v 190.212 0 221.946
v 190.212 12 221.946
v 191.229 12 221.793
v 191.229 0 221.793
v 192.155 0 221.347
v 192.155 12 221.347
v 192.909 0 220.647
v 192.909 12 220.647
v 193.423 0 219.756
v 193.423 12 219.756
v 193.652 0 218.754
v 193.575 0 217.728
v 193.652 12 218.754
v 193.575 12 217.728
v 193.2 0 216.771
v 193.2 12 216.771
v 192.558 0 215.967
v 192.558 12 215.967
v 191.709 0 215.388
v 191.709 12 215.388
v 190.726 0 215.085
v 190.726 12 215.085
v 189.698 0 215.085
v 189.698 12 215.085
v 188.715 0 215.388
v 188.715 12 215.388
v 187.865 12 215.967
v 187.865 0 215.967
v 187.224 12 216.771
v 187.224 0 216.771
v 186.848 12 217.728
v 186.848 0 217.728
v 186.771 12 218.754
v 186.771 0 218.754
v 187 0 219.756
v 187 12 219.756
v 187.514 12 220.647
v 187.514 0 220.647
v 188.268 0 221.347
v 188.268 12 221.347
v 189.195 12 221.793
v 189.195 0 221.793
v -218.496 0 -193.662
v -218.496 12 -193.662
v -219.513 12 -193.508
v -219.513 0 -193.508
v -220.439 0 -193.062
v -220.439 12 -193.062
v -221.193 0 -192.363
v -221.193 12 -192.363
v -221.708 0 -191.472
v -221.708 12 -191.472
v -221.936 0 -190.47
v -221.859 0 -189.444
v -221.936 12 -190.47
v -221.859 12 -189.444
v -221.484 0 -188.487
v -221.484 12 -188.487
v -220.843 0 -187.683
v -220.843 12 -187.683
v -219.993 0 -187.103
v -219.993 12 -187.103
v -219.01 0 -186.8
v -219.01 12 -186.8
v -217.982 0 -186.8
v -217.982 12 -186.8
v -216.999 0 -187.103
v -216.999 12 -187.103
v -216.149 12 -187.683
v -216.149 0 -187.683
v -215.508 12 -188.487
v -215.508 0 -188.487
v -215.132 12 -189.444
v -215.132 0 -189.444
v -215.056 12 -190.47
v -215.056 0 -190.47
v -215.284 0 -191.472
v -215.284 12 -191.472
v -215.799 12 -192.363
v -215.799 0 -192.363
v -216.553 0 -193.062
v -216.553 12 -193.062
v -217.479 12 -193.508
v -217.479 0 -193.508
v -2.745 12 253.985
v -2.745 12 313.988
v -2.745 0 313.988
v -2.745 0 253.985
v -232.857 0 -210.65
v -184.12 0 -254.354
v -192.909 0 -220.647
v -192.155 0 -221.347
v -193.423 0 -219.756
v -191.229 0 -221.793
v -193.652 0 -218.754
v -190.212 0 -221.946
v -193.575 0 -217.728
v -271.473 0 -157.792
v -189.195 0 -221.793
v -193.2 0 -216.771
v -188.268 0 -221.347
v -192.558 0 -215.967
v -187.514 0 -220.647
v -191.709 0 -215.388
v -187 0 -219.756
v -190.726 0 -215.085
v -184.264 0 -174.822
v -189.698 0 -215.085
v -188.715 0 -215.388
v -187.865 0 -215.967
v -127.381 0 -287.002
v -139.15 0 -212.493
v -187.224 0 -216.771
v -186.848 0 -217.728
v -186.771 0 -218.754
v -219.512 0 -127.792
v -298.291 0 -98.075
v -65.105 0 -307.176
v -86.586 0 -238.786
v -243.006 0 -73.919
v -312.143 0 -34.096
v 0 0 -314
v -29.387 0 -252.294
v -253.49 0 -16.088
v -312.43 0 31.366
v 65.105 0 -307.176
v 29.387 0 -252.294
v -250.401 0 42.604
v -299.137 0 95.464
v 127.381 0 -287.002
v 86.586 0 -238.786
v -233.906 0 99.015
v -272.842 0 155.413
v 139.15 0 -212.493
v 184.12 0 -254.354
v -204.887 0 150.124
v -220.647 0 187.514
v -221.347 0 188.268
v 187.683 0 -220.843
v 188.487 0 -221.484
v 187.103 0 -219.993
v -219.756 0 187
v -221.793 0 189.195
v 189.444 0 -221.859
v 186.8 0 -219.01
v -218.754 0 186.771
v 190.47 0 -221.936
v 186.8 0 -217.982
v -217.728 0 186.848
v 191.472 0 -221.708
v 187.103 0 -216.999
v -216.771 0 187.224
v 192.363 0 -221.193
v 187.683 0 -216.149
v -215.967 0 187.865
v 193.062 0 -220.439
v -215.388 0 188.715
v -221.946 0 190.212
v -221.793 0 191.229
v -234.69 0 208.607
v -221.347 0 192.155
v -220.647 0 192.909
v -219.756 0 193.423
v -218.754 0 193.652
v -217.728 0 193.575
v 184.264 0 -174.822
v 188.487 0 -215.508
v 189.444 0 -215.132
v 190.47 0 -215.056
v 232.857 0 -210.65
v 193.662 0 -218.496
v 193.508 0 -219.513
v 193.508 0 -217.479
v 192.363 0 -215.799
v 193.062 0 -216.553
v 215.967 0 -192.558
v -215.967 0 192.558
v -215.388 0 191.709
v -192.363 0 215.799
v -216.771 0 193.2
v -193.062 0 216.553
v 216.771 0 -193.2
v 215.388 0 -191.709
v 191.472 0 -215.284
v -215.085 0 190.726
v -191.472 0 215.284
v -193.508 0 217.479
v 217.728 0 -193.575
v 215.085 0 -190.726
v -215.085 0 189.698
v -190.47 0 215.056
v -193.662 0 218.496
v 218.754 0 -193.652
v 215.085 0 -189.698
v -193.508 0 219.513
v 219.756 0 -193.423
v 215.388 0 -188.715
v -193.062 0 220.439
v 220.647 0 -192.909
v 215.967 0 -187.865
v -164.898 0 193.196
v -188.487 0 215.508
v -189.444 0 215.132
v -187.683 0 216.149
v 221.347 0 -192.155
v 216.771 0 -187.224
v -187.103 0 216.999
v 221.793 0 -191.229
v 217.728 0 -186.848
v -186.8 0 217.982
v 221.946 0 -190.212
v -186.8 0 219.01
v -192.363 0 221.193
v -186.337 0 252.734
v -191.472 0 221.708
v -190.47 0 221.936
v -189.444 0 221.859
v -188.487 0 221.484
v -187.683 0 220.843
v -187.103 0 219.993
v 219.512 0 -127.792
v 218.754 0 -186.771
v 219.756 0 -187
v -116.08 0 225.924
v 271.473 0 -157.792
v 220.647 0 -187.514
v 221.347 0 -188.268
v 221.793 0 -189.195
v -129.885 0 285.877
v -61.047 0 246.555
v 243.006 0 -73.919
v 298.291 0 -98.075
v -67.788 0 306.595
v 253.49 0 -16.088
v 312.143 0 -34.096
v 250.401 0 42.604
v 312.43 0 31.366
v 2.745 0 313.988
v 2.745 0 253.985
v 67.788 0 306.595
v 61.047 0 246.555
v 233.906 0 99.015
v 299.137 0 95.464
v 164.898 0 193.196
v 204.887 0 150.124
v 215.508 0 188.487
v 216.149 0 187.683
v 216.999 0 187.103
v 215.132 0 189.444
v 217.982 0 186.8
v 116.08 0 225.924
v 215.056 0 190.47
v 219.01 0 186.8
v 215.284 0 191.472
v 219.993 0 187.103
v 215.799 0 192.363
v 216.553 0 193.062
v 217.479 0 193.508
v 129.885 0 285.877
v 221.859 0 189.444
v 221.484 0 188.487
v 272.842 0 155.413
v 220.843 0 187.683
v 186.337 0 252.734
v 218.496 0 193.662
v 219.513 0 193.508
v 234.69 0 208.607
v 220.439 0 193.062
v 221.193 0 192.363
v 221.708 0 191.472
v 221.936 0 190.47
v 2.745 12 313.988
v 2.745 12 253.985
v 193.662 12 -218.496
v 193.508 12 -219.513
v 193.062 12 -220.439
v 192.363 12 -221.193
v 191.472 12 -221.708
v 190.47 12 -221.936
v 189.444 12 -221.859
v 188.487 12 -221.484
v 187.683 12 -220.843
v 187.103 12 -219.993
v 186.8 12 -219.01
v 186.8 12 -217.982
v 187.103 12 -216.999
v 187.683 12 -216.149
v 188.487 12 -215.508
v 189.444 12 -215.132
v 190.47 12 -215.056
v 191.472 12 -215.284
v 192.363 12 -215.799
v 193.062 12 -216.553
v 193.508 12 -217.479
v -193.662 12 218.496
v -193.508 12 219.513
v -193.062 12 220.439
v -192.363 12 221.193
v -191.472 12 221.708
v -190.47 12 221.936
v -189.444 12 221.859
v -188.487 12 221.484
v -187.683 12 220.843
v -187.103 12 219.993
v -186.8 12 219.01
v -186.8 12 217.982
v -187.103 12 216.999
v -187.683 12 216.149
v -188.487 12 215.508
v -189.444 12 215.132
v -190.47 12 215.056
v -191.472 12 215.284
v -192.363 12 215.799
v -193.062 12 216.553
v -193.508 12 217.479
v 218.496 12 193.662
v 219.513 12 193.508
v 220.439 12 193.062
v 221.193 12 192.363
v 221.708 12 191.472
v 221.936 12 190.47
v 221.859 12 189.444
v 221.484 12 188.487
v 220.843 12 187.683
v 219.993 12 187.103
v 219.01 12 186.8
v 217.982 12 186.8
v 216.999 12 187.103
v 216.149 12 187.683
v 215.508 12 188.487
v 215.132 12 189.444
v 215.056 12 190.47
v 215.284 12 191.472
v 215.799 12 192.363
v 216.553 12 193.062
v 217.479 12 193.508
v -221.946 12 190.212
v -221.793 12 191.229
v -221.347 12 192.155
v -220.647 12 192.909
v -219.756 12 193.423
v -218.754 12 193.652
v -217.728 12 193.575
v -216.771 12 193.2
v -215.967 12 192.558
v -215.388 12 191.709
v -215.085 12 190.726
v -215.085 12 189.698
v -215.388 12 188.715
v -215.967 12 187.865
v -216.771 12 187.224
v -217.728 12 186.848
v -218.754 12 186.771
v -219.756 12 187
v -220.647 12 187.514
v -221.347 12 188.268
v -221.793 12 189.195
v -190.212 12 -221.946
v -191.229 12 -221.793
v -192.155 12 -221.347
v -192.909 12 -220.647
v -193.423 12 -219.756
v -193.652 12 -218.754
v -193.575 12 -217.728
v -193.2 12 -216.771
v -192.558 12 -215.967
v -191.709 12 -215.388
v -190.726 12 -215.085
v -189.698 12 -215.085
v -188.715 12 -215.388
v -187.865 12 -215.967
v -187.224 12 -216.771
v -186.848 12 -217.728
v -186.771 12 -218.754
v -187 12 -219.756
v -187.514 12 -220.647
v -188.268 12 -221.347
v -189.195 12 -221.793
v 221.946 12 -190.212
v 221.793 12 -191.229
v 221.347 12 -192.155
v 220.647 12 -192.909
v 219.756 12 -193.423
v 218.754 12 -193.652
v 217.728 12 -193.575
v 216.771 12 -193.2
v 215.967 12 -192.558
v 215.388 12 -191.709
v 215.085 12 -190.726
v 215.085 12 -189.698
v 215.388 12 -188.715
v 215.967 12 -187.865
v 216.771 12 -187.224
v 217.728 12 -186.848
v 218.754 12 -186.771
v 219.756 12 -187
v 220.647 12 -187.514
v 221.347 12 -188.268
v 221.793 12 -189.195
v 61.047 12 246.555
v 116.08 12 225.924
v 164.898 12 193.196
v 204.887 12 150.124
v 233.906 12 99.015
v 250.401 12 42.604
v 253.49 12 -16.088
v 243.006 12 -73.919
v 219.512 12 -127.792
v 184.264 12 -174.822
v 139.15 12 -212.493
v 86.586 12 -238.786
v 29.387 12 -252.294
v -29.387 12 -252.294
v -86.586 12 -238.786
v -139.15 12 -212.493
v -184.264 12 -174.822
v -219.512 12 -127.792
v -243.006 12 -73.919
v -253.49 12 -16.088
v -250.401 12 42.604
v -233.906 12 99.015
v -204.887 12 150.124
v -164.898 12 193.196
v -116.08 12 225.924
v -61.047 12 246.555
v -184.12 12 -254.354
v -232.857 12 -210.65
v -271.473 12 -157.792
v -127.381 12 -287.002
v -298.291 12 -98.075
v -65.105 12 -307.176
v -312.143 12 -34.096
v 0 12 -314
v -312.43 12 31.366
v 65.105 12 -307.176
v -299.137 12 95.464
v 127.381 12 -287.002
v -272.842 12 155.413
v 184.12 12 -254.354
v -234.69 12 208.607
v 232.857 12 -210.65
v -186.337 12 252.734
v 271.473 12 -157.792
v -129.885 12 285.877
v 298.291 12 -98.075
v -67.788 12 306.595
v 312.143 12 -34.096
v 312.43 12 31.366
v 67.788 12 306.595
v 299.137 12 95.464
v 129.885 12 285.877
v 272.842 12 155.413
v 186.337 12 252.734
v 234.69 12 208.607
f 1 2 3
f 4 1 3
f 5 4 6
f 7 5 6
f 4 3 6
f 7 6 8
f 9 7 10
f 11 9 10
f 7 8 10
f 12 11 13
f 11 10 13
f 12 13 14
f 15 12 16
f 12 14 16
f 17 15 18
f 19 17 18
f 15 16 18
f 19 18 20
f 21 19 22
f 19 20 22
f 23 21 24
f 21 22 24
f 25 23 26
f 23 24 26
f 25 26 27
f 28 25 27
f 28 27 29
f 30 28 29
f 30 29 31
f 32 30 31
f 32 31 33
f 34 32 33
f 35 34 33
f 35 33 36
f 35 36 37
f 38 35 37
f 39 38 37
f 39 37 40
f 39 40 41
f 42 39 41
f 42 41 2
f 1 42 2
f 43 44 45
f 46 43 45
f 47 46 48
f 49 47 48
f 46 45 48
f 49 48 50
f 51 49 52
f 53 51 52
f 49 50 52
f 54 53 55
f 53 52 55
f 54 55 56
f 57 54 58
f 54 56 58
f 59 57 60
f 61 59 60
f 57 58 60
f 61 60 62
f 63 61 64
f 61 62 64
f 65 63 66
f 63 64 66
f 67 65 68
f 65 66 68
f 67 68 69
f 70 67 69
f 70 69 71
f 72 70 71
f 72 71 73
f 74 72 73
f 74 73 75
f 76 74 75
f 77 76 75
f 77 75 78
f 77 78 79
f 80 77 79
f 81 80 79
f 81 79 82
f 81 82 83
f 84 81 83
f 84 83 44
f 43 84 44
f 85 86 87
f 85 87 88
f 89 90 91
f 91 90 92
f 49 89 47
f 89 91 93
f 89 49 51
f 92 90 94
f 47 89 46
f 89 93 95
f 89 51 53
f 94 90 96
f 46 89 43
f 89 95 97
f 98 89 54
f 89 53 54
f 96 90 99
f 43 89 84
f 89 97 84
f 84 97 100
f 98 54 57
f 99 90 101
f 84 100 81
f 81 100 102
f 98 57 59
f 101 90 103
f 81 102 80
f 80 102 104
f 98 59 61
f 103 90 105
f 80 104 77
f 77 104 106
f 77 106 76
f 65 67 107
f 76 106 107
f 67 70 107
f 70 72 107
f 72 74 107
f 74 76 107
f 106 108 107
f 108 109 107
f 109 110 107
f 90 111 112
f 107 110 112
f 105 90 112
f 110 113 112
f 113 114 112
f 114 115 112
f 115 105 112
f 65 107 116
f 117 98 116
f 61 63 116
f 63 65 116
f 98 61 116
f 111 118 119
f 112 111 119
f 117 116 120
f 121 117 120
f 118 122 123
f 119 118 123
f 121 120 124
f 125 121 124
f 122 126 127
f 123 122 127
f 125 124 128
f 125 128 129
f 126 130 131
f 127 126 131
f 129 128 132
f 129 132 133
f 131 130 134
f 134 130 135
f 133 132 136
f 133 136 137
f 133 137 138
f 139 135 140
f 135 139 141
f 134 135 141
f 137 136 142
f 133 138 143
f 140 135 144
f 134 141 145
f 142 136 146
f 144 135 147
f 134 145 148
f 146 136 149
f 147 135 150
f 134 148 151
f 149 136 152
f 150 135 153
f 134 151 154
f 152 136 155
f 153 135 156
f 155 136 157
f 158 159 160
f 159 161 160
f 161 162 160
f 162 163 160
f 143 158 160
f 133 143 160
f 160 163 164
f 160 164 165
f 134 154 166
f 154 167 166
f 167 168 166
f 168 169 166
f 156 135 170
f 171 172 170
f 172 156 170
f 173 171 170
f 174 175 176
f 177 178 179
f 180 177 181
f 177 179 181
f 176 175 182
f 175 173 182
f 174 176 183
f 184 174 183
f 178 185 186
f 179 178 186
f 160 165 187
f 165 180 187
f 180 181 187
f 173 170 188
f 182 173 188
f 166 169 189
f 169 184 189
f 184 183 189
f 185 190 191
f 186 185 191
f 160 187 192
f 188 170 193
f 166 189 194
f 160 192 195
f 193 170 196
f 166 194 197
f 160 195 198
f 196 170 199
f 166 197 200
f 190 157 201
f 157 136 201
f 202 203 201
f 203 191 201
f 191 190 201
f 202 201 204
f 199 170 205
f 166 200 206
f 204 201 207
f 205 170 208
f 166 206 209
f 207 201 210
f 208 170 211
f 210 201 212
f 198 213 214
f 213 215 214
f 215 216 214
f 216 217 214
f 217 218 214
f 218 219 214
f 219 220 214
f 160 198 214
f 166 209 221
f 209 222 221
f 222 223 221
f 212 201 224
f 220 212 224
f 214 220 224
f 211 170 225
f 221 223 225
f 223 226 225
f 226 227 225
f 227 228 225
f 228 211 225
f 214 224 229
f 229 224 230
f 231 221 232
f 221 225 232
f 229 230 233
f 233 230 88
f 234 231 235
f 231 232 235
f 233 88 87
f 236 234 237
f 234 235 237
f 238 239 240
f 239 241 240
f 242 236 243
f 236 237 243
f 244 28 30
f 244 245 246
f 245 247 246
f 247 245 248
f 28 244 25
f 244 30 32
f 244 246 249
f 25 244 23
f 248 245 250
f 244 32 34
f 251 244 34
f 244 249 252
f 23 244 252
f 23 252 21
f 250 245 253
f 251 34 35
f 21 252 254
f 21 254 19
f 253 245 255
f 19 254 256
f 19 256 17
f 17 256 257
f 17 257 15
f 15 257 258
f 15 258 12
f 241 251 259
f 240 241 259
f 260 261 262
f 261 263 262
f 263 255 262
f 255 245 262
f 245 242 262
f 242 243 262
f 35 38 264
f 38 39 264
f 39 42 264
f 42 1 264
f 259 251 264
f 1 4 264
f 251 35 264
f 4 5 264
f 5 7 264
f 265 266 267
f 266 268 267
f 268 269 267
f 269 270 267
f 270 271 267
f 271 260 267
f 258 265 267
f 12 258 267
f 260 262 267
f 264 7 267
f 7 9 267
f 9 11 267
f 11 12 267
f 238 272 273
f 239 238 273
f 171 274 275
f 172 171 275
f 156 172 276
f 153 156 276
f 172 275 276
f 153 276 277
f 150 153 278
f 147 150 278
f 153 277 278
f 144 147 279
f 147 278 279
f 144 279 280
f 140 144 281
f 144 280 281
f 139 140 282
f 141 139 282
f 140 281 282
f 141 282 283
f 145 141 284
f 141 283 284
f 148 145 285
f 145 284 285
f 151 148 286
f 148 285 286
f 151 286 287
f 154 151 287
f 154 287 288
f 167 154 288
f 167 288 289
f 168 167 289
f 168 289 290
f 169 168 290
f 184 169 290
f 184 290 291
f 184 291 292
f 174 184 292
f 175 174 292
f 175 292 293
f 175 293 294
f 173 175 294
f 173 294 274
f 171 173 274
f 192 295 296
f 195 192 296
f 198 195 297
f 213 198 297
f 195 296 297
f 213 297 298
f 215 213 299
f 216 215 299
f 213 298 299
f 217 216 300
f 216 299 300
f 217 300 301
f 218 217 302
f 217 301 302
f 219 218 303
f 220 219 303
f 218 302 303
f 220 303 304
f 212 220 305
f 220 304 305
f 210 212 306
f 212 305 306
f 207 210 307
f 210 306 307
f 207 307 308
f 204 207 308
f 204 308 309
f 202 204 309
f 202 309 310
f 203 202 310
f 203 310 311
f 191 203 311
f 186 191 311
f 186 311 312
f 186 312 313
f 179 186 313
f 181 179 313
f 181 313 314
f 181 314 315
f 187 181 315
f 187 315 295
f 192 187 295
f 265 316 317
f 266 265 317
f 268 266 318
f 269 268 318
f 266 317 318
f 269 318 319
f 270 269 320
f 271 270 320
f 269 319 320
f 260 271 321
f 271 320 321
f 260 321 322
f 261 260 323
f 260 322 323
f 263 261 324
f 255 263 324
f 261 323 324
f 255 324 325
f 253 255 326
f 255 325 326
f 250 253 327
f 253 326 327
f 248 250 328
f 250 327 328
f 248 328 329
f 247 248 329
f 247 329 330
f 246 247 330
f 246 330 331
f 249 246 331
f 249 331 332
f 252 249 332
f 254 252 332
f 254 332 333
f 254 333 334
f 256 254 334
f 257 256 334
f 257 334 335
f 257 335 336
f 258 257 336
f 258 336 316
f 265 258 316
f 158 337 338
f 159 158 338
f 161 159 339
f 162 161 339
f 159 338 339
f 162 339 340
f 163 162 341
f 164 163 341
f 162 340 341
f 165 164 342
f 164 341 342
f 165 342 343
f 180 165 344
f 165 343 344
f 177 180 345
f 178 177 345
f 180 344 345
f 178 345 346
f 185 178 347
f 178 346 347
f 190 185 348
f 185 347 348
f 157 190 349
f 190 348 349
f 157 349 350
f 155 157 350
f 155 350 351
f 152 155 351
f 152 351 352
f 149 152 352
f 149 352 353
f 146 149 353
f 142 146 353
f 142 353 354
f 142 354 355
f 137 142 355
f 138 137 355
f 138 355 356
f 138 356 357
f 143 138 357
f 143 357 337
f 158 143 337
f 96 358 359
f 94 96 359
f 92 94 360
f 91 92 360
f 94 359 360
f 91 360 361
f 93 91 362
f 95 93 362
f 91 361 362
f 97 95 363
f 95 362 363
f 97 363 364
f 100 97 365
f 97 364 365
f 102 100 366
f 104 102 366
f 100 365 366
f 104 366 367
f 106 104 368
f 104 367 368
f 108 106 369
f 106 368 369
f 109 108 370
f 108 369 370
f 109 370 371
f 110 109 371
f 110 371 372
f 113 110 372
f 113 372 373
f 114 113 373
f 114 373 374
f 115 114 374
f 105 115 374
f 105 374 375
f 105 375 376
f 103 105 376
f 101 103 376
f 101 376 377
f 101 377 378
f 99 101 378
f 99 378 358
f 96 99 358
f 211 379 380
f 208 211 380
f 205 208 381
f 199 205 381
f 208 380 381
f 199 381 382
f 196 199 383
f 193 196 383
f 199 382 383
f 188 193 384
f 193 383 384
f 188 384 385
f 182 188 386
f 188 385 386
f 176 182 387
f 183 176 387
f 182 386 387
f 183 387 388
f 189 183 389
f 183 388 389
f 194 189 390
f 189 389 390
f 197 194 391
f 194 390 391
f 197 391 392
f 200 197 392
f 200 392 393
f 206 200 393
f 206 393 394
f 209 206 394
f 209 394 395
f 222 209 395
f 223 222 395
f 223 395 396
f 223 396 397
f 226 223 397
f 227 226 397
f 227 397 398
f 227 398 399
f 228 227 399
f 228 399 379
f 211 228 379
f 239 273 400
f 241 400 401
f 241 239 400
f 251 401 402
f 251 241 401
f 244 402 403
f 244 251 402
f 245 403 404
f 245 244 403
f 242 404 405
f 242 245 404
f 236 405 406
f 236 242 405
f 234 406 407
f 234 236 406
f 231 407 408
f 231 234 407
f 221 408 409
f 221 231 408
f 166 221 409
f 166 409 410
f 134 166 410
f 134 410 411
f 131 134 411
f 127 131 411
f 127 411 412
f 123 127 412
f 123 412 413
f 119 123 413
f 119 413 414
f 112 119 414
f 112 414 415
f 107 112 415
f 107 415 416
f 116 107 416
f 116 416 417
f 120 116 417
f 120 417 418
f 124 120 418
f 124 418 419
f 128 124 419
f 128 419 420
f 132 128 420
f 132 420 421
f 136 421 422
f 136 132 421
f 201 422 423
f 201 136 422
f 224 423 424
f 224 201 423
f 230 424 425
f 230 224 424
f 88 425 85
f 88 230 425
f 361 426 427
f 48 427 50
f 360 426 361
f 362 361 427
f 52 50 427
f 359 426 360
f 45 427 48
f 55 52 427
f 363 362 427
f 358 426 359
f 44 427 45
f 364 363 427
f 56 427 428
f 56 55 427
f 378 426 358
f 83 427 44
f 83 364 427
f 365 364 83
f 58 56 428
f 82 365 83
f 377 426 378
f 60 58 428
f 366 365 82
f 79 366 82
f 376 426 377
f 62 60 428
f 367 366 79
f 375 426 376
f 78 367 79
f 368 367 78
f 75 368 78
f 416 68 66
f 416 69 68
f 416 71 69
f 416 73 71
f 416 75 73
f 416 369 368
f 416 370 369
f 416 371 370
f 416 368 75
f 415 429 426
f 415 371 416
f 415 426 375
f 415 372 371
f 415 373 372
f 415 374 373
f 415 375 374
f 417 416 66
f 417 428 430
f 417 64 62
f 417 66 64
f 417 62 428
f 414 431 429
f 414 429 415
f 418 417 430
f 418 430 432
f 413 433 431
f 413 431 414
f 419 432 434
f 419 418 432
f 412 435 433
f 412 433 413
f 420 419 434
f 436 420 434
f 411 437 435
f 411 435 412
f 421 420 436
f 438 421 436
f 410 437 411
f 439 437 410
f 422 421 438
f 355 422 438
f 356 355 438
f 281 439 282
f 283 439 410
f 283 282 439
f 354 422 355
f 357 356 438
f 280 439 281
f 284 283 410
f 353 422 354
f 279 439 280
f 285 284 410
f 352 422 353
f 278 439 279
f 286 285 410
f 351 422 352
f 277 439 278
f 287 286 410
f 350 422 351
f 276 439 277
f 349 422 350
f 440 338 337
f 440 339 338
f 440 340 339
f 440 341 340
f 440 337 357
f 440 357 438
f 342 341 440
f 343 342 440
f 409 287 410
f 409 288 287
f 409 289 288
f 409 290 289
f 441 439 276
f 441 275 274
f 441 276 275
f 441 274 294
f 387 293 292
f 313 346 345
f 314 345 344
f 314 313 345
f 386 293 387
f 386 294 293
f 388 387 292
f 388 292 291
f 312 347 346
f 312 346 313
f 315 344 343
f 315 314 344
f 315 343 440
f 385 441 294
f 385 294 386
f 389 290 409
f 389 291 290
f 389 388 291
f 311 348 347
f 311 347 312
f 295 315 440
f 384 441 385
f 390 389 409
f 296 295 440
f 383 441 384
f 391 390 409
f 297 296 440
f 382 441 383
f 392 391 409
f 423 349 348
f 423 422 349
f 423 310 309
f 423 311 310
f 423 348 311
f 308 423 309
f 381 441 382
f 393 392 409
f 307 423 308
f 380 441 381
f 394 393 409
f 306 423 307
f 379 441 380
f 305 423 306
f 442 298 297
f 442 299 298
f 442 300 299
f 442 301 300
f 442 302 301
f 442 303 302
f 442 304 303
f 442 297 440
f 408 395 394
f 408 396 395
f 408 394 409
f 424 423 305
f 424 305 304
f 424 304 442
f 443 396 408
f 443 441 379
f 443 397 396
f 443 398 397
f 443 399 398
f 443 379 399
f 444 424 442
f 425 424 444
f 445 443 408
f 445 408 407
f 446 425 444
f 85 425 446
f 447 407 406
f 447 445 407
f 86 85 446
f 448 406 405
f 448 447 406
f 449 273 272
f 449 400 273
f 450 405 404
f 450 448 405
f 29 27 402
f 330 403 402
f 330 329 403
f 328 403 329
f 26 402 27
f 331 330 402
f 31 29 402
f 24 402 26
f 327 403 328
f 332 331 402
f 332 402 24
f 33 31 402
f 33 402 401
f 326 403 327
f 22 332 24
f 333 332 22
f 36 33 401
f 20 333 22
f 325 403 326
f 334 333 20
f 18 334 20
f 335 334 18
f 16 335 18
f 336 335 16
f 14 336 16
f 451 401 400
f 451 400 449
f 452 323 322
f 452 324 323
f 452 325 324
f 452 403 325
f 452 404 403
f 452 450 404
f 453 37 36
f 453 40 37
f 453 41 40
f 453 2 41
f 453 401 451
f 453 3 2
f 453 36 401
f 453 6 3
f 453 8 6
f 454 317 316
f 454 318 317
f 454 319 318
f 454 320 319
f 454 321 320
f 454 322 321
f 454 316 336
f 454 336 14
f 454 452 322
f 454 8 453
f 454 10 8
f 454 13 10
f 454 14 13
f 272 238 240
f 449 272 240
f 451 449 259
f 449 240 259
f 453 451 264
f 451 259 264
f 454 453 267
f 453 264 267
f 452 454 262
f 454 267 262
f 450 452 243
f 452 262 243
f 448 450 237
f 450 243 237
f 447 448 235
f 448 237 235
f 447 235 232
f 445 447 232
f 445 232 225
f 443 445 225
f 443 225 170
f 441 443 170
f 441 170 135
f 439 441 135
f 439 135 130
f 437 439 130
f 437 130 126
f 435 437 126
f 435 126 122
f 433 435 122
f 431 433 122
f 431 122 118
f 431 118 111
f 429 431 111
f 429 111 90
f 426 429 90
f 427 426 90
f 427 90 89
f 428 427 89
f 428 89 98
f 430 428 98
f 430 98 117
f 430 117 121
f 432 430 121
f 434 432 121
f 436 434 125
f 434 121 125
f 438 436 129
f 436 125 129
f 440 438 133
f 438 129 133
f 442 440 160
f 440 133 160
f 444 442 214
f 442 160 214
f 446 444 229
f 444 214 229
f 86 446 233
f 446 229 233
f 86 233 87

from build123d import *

# Parameters (mm, degrees)
SKETCH1_R           = 314
SKETCH1_R_2         = 254
BOSS_EXTRUDE1_DEPTH = 12
SKETCH2_W           = 5.489817528
SKETCH2_H           = 110.495913403
CUT_EXTRUDE1_DEPTH  = 445.22516813
SKETCH3_R           = 3.45
SCREW_HOLE_DEPTH    = 445.22516813
CIRPATTERN1_COUNT   = 4


with BuildPart() as part:
    # Sketch1 → Boss-Extrude1 (new body)
    with BuildSketch(Plane(origin=(0, 0, 0), x_dir=(1, 0, 0), z_dir=(0, 1, 0))):
        with Locations(Location((0, 0, 0), (0, 0, 270))):
            Circle(SKETCH1_R)
        with Locations(Location((0, 0, 0), (0, 0, 270))):
            Circle(SKETCH1_R_2, mode=Mode.SUBTRACT)
    extrude(amount=BOSS_EXTRUDE1_DEPTH)

    # Sketch2 → Cut-Extrude1 (cut, through all)
    with BuildSketch(Plane(origin=(0, 12, 0), x_dir=(1, 0, 0), z_dir=(0, 1, 0))):
        with Locations((0, -289.886753328)):
            Rectangle(SKETCH2_W, SKETCH2_H)
    extrude(amount=-CUT_EXTRUDE1_DEPTH, mode=Mode.SUBTRACT)

    # Sketch3 → screw hole (cut, through all)
    with BuildSketch(Plane(origin=(0, 12, 0), x_dir=(1, 0, 0), z_dir=(0, 1, 0))):
        with Locations(Location((190.211724139, -218.495995387, 0), (0, 0, 270))):
            Circle(SKETCH3_R)
        with Locations(Location((218.495995387, -190.211724139, 0), (0, 0, 270))):
            Circle(SKETCH3_R)
    screw_hole = extrude(amount=-SCREW_HOLE_DEPTH, mode=Mode.SUBTRACT)

    # CirPattern1: screw hole ×4 about axis
    cirpattern1_axis = Axis((0, 0, 0), (0, 1, 0))
    for i in range(1, CIRPATTERN1_COUNT):
        add(screw_hole.rotate(cirpattern1_axis, i * 360 / CIRPATTERN1_COUNT), mode=Mode.SUBTRACT)


solid = part.part
